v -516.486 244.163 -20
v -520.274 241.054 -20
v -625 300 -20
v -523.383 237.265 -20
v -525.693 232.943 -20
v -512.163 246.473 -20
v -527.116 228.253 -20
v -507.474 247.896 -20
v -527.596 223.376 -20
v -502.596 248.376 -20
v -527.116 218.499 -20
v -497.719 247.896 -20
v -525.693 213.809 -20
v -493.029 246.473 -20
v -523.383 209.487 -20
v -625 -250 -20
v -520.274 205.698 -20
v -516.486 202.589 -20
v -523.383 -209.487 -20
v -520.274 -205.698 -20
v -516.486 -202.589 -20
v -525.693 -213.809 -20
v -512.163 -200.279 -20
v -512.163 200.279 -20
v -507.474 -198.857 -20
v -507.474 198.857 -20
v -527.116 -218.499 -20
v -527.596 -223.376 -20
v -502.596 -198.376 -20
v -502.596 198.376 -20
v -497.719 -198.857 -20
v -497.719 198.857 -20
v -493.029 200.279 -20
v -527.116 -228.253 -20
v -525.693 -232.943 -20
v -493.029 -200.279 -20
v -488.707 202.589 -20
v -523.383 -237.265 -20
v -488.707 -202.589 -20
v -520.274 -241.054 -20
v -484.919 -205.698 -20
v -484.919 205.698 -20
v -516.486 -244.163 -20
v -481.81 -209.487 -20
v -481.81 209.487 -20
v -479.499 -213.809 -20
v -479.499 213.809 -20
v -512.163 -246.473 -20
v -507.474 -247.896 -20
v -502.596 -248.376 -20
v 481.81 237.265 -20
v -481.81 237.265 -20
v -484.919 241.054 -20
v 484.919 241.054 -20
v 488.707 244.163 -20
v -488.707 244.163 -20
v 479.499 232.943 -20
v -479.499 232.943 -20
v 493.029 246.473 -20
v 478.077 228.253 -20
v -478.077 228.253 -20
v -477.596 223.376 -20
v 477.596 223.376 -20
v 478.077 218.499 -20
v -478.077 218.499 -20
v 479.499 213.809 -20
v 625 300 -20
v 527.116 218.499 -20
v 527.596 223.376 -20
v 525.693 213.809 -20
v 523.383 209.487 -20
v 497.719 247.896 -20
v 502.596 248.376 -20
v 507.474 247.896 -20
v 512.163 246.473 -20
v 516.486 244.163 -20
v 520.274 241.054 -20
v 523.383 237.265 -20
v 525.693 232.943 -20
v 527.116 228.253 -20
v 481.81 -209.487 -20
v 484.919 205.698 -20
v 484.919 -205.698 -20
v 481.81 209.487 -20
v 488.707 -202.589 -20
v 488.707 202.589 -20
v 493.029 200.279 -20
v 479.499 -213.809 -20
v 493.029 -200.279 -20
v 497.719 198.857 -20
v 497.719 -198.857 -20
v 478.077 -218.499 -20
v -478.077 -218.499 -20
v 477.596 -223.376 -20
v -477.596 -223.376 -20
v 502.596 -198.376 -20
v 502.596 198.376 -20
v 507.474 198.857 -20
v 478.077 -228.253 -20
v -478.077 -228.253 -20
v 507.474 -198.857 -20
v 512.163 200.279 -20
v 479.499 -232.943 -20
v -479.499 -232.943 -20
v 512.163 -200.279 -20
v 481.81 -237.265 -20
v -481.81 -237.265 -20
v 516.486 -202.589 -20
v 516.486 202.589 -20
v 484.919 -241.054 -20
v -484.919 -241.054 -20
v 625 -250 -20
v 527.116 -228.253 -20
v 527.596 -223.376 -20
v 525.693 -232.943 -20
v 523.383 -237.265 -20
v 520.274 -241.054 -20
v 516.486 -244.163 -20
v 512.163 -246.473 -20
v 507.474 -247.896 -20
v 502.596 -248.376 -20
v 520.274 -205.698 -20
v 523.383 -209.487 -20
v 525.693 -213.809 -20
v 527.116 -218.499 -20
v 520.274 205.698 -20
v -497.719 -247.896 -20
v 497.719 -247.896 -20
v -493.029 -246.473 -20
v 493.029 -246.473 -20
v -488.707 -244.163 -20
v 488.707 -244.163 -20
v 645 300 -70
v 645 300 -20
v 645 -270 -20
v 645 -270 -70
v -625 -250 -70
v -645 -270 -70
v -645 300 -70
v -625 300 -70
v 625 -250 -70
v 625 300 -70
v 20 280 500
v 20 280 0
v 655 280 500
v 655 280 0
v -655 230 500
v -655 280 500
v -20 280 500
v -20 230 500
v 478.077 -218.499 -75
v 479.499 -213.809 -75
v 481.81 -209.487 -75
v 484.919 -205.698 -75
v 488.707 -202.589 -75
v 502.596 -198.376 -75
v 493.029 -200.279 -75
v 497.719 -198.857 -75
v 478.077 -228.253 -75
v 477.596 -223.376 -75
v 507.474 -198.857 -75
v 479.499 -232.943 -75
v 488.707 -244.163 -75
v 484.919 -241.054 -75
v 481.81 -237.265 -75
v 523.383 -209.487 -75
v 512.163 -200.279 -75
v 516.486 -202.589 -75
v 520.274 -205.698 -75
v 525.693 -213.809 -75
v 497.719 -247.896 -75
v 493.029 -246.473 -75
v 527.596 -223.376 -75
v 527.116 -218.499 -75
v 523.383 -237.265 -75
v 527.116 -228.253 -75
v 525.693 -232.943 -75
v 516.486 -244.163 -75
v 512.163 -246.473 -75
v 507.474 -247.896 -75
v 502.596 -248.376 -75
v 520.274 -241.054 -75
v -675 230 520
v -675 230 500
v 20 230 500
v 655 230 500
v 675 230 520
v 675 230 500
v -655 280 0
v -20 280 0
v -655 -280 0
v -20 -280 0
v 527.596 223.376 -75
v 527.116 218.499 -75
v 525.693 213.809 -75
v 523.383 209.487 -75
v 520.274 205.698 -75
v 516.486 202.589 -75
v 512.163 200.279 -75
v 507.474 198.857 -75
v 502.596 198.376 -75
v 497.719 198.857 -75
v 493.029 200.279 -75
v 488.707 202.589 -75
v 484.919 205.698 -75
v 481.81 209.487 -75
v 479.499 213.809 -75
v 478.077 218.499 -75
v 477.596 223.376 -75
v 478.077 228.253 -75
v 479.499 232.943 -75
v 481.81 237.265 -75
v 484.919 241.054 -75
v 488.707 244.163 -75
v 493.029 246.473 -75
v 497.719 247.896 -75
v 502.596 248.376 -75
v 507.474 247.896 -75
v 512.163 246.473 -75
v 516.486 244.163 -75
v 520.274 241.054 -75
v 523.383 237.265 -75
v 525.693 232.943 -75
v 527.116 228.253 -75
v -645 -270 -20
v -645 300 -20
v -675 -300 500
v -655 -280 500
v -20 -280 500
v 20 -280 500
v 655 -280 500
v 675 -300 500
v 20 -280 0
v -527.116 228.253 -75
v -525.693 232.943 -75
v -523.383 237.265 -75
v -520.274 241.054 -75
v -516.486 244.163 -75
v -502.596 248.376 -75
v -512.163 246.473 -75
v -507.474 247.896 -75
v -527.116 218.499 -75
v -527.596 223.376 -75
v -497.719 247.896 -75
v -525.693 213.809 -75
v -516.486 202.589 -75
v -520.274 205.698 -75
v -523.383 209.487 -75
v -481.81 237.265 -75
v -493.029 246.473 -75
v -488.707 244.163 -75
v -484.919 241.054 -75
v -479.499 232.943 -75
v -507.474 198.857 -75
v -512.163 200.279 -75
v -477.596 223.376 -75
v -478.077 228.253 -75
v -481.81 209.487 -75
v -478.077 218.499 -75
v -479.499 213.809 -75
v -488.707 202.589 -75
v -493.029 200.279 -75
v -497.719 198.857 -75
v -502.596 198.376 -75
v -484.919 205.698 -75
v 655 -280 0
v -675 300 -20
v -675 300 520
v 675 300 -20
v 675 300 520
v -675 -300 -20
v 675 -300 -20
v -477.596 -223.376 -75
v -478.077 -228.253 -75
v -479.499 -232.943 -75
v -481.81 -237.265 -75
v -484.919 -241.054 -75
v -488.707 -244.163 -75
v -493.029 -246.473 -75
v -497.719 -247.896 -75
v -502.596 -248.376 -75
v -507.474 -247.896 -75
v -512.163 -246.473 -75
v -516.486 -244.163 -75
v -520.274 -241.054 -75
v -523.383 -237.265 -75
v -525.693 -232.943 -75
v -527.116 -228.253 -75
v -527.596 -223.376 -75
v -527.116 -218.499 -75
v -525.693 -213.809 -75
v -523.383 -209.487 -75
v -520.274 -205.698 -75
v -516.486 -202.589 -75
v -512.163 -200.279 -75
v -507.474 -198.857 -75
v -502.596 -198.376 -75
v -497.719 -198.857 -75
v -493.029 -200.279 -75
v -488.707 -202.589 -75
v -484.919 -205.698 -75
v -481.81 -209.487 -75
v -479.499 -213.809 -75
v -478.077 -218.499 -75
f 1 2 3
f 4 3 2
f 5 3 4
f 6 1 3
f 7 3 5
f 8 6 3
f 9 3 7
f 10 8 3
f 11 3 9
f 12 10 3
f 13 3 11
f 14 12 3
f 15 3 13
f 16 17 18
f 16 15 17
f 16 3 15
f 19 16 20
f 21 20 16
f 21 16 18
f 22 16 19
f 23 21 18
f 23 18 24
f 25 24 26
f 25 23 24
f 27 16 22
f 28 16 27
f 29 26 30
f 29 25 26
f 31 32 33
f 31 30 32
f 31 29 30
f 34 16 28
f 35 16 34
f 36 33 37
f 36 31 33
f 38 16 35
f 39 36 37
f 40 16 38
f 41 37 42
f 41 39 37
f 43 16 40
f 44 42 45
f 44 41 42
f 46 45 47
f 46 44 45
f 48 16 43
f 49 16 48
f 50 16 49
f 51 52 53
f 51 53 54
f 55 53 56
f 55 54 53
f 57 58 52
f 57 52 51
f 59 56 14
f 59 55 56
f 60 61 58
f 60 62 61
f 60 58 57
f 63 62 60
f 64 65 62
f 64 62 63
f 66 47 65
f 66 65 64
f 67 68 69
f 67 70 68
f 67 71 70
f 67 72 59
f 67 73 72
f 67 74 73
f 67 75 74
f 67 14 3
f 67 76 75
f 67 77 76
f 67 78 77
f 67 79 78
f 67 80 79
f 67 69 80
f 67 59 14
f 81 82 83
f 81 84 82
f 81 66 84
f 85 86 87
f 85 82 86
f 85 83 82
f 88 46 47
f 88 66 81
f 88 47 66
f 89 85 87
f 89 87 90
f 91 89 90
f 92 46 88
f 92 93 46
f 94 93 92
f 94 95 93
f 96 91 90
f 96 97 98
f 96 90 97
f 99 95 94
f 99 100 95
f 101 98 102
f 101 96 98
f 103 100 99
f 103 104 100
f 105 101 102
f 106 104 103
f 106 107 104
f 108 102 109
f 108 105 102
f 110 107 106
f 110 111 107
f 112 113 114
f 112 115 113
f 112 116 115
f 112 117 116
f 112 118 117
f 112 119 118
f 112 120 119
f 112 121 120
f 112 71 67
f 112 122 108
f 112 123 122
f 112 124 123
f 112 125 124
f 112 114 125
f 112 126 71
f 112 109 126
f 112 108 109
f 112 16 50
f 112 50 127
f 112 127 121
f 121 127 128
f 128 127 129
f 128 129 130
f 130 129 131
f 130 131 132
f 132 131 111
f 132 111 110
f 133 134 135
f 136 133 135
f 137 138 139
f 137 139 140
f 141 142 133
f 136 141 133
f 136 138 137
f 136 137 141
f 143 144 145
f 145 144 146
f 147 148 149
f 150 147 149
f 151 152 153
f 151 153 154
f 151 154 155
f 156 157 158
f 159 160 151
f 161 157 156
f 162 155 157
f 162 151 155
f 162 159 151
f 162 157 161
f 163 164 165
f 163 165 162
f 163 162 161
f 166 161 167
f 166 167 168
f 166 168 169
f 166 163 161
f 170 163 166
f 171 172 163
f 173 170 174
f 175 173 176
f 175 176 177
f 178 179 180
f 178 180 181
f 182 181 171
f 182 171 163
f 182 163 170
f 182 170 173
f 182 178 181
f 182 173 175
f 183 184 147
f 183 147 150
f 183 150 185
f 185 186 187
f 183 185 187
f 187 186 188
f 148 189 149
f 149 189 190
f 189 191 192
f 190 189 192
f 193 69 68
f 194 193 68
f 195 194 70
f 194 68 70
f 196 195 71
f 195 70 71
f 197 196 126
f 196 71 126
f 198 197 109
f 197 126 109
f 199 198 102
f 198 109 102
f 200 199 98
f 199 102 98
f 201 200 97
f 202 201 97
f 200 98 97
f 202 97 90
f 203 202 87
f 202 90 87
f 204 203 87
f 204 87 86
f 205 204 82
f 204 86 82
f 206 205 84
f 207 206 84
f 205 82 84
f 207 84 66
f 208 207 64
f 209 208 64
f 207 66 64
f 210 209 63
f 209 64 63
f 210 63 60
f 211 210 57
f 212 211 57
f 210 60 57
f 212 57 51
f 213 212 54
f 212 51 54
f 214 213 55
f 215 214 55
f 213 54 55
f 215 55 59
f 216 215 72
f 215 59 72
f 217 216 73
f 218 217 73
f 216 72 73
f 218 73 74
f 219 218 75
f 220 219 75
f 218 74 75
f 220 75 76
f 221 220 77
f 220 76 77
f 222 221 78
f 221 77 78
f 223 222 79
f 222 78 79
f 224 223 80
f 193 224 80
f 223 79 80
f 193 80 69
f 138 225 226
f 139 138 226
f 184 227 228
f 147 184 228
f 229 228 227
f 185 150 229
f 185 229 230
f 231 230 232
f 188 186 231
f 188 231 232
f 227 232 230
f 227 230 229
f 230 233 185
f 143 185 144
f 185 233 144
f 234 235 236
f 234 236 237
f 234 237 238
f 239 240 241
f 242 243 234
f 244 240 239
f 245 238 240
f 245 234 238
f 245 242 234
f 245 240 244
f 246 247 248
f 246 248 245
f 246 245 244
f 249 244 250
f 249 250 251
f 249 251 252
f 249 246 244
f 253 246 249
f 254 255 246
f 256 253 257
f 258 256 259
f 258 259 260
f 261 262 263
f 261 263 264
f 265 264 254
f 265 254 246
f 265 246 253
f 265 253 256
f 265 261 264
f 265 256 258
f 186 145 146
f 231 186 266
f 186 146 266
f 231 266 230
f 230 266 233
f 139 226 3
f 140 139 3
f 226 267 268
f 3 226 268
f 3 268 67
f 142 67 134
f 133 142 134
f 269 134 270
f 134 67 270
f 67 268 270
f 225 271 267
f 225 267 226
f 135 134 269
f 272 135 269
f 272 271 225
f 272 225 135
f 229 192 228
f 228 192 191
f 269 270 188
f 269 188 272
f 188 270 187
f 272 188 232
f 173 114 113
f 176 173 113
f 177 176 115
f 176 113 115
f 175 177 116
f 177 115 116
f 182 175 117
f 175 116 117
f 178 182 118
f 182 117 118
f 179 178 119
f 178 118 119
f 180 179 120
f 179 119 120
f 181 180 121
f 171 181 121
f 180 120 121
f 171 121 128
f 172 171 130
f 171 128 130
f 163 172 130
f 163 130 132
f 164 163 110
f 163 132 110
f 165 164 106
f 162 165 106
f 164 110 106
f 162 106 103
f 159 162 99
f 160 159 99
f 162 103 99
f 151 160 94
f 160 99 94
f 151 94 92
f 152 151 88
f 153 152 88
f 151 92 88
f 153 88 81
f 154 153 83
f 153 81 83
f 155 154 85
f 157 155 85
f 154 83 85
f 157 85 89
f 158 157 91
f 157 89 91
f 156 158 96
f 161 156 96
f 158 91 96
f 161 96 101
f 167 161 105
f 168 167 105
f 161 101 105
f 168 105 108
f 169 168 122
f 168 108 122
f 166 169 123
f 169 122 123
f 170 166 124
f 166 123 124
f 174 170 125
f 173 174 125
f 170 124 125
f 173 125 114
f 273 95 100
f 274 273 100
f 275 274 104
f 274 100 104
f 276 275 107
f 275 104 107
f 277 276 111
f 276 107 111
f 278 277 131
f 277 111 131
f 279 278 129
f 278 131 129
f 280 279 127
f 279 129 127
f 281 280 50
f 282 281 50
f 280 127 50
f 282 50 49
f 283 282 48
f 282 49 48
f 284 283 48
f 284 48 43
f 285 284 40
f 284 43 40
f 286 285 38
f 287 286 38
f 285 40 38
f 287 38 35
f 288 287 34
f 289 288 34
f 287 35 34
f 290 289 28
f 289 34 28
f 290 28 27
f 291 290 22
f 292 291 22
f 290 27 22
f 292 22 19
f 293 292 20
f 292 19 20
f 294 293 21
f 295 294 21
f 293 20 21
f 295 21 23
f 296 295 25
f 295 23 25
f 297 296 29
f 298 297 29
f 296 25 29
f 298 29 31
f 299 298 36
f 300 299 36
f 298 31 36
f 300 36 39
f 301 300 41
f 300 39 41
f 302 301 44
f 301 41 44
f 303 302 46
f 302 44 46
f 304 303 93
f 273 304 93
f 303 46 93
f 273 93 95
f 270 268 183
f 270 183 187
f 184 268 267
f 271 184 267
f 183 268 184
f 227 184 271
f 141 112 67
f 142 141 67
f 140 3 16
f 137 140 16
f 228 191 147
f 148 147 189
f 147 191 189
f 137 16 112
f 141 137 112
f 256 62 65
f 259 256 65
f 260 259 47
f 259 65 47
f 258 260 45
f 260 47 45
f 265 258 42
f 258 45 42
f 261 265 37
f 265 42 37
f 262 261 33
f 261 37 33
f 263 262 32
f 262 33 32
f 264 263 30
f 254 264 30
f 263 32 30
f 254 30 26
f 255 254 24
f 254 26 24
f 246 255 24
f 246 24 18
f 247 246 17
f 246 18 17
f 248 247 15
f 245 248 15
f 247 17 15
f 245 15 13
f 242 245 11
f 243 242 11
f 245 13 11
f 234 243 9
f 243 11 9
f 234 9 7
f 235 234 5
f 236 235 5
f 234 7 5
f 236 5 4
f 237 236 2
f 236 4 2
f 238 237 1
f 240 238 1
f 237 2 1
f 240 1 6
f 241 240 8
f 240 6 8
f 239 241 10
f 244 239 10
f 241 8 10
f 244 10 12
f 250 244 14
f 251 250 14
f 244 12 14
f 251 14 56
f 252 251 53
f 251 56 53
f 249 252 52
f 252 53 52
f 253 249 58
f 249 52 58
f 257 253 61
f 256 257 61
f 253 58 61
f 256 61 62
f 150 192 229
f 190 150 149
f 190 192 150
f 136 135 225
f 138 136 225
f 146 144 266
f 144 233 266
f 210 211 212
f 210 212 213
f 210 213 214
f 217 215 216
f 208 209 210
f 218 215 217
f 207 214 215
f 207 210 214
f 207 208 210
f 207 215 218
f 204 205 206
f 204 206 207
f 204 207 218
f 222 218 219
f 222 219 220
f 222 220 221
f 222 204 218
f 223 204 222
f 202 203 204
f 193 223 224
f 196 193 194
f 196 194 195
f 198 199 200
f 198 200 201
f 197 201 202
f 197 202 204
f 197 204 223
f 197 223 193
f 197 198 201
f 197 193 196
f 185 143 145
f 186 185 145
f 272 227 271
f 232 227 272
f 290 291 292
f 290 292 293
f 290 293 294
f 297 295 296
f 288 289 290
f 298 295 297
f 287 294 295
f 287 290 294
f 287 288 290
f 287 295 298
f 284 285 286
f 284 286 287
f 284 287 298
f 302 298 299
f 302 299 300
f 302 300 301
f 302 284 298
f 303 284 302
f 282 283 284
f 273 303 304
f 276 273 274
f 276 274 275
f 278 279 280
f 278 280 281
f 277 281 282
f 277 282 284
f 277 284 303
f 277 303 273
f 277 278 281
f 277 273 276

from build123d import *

# Parameters (mm, degrees)
F0_W     = 1350
F0_H     = 600
F0_W_2   = 20
F0_H_2   = 560
F1_DEPTH = 500
F2_W     = 1350
F2_H     = 70
F3_DEPTH = 20
F4_W     = 1350
F4_H     = 600
F5_DEPTH = 20
F6_R     = 25
F7_DEPTH = 55
F9_DEPTH = 50


with BuildPart() as f1:
    # F0 (on Top) → F1 (new body)
    with BuildSketch(Plane.XY):
        Rectangle(F0_W, F0_H)
        Polygon((-655, -280), (-655, 280), (-20, 280), (0, 280), (20, 280), (655, 280), (655, -280), (20, -280), (0, -280), (-20, -280), align=None, mode=Mode.SUBTRACT)
        with Locations((10, 0)):
            Rectangle(F0_W_2, F0_H_2)
        with Locations((-10, 0)):
            Rectangle(F0_W_2, F0_H_2)
    extrude(amount=F1_DEPTH)

    # F2 (on face) → F3 (join)
    with BuildSketch(Plane.XY.offset(500)):
        with Locations((0, 265)):
            Rectangle(F2_W, F2_H)
    extrude(amount=F3_DEPTH)

    # F4 (on face) → F5 (join)
    with BuildSketch(Plane(origin=(0, 0, 0), x_dir=(1, 0, 0), z_dir=(0, 0, -1))):
        Rectangle(F4_W, F4_H)
    extrude(amount=F5_DEPTH)

    # F6 (on face) → F7 (join)
    with BuildSketch(Plane(origin=(0, 0, -20), x_dir=(1, 0, 0), z_dir=(0, 0, -1))):
        with Locations((-502.596352, 223.376156)):
            Circle(F6_R)
        with Locations((-502.596352, -223.376156)):
            Circle(F6_R)
        with Locations((502.596352, -223.376156)):
            Circle(F6_R)
        with Locations((502.596352, 223.376156)):
            Circle(F6_R)
    extrude(amount=F7_DEPTH)

    # F8 (on face) → F9 (join)
    with BuildSketch(Plane(origin=(0, 0, -20), x_dir=(1, 0, 0), z_dir=(0, 0, -1))):
        Polygon((645, 270), (-645, 270), (-645, -270), (-645, -300), (-625, -300), (-625, -250), (-625, 250), (625, 250), (625, -250), (625, -300), (645, -300), (645, -270), align=None)
    extrude(amount=F9_DEPTH)


solid = f1.part
